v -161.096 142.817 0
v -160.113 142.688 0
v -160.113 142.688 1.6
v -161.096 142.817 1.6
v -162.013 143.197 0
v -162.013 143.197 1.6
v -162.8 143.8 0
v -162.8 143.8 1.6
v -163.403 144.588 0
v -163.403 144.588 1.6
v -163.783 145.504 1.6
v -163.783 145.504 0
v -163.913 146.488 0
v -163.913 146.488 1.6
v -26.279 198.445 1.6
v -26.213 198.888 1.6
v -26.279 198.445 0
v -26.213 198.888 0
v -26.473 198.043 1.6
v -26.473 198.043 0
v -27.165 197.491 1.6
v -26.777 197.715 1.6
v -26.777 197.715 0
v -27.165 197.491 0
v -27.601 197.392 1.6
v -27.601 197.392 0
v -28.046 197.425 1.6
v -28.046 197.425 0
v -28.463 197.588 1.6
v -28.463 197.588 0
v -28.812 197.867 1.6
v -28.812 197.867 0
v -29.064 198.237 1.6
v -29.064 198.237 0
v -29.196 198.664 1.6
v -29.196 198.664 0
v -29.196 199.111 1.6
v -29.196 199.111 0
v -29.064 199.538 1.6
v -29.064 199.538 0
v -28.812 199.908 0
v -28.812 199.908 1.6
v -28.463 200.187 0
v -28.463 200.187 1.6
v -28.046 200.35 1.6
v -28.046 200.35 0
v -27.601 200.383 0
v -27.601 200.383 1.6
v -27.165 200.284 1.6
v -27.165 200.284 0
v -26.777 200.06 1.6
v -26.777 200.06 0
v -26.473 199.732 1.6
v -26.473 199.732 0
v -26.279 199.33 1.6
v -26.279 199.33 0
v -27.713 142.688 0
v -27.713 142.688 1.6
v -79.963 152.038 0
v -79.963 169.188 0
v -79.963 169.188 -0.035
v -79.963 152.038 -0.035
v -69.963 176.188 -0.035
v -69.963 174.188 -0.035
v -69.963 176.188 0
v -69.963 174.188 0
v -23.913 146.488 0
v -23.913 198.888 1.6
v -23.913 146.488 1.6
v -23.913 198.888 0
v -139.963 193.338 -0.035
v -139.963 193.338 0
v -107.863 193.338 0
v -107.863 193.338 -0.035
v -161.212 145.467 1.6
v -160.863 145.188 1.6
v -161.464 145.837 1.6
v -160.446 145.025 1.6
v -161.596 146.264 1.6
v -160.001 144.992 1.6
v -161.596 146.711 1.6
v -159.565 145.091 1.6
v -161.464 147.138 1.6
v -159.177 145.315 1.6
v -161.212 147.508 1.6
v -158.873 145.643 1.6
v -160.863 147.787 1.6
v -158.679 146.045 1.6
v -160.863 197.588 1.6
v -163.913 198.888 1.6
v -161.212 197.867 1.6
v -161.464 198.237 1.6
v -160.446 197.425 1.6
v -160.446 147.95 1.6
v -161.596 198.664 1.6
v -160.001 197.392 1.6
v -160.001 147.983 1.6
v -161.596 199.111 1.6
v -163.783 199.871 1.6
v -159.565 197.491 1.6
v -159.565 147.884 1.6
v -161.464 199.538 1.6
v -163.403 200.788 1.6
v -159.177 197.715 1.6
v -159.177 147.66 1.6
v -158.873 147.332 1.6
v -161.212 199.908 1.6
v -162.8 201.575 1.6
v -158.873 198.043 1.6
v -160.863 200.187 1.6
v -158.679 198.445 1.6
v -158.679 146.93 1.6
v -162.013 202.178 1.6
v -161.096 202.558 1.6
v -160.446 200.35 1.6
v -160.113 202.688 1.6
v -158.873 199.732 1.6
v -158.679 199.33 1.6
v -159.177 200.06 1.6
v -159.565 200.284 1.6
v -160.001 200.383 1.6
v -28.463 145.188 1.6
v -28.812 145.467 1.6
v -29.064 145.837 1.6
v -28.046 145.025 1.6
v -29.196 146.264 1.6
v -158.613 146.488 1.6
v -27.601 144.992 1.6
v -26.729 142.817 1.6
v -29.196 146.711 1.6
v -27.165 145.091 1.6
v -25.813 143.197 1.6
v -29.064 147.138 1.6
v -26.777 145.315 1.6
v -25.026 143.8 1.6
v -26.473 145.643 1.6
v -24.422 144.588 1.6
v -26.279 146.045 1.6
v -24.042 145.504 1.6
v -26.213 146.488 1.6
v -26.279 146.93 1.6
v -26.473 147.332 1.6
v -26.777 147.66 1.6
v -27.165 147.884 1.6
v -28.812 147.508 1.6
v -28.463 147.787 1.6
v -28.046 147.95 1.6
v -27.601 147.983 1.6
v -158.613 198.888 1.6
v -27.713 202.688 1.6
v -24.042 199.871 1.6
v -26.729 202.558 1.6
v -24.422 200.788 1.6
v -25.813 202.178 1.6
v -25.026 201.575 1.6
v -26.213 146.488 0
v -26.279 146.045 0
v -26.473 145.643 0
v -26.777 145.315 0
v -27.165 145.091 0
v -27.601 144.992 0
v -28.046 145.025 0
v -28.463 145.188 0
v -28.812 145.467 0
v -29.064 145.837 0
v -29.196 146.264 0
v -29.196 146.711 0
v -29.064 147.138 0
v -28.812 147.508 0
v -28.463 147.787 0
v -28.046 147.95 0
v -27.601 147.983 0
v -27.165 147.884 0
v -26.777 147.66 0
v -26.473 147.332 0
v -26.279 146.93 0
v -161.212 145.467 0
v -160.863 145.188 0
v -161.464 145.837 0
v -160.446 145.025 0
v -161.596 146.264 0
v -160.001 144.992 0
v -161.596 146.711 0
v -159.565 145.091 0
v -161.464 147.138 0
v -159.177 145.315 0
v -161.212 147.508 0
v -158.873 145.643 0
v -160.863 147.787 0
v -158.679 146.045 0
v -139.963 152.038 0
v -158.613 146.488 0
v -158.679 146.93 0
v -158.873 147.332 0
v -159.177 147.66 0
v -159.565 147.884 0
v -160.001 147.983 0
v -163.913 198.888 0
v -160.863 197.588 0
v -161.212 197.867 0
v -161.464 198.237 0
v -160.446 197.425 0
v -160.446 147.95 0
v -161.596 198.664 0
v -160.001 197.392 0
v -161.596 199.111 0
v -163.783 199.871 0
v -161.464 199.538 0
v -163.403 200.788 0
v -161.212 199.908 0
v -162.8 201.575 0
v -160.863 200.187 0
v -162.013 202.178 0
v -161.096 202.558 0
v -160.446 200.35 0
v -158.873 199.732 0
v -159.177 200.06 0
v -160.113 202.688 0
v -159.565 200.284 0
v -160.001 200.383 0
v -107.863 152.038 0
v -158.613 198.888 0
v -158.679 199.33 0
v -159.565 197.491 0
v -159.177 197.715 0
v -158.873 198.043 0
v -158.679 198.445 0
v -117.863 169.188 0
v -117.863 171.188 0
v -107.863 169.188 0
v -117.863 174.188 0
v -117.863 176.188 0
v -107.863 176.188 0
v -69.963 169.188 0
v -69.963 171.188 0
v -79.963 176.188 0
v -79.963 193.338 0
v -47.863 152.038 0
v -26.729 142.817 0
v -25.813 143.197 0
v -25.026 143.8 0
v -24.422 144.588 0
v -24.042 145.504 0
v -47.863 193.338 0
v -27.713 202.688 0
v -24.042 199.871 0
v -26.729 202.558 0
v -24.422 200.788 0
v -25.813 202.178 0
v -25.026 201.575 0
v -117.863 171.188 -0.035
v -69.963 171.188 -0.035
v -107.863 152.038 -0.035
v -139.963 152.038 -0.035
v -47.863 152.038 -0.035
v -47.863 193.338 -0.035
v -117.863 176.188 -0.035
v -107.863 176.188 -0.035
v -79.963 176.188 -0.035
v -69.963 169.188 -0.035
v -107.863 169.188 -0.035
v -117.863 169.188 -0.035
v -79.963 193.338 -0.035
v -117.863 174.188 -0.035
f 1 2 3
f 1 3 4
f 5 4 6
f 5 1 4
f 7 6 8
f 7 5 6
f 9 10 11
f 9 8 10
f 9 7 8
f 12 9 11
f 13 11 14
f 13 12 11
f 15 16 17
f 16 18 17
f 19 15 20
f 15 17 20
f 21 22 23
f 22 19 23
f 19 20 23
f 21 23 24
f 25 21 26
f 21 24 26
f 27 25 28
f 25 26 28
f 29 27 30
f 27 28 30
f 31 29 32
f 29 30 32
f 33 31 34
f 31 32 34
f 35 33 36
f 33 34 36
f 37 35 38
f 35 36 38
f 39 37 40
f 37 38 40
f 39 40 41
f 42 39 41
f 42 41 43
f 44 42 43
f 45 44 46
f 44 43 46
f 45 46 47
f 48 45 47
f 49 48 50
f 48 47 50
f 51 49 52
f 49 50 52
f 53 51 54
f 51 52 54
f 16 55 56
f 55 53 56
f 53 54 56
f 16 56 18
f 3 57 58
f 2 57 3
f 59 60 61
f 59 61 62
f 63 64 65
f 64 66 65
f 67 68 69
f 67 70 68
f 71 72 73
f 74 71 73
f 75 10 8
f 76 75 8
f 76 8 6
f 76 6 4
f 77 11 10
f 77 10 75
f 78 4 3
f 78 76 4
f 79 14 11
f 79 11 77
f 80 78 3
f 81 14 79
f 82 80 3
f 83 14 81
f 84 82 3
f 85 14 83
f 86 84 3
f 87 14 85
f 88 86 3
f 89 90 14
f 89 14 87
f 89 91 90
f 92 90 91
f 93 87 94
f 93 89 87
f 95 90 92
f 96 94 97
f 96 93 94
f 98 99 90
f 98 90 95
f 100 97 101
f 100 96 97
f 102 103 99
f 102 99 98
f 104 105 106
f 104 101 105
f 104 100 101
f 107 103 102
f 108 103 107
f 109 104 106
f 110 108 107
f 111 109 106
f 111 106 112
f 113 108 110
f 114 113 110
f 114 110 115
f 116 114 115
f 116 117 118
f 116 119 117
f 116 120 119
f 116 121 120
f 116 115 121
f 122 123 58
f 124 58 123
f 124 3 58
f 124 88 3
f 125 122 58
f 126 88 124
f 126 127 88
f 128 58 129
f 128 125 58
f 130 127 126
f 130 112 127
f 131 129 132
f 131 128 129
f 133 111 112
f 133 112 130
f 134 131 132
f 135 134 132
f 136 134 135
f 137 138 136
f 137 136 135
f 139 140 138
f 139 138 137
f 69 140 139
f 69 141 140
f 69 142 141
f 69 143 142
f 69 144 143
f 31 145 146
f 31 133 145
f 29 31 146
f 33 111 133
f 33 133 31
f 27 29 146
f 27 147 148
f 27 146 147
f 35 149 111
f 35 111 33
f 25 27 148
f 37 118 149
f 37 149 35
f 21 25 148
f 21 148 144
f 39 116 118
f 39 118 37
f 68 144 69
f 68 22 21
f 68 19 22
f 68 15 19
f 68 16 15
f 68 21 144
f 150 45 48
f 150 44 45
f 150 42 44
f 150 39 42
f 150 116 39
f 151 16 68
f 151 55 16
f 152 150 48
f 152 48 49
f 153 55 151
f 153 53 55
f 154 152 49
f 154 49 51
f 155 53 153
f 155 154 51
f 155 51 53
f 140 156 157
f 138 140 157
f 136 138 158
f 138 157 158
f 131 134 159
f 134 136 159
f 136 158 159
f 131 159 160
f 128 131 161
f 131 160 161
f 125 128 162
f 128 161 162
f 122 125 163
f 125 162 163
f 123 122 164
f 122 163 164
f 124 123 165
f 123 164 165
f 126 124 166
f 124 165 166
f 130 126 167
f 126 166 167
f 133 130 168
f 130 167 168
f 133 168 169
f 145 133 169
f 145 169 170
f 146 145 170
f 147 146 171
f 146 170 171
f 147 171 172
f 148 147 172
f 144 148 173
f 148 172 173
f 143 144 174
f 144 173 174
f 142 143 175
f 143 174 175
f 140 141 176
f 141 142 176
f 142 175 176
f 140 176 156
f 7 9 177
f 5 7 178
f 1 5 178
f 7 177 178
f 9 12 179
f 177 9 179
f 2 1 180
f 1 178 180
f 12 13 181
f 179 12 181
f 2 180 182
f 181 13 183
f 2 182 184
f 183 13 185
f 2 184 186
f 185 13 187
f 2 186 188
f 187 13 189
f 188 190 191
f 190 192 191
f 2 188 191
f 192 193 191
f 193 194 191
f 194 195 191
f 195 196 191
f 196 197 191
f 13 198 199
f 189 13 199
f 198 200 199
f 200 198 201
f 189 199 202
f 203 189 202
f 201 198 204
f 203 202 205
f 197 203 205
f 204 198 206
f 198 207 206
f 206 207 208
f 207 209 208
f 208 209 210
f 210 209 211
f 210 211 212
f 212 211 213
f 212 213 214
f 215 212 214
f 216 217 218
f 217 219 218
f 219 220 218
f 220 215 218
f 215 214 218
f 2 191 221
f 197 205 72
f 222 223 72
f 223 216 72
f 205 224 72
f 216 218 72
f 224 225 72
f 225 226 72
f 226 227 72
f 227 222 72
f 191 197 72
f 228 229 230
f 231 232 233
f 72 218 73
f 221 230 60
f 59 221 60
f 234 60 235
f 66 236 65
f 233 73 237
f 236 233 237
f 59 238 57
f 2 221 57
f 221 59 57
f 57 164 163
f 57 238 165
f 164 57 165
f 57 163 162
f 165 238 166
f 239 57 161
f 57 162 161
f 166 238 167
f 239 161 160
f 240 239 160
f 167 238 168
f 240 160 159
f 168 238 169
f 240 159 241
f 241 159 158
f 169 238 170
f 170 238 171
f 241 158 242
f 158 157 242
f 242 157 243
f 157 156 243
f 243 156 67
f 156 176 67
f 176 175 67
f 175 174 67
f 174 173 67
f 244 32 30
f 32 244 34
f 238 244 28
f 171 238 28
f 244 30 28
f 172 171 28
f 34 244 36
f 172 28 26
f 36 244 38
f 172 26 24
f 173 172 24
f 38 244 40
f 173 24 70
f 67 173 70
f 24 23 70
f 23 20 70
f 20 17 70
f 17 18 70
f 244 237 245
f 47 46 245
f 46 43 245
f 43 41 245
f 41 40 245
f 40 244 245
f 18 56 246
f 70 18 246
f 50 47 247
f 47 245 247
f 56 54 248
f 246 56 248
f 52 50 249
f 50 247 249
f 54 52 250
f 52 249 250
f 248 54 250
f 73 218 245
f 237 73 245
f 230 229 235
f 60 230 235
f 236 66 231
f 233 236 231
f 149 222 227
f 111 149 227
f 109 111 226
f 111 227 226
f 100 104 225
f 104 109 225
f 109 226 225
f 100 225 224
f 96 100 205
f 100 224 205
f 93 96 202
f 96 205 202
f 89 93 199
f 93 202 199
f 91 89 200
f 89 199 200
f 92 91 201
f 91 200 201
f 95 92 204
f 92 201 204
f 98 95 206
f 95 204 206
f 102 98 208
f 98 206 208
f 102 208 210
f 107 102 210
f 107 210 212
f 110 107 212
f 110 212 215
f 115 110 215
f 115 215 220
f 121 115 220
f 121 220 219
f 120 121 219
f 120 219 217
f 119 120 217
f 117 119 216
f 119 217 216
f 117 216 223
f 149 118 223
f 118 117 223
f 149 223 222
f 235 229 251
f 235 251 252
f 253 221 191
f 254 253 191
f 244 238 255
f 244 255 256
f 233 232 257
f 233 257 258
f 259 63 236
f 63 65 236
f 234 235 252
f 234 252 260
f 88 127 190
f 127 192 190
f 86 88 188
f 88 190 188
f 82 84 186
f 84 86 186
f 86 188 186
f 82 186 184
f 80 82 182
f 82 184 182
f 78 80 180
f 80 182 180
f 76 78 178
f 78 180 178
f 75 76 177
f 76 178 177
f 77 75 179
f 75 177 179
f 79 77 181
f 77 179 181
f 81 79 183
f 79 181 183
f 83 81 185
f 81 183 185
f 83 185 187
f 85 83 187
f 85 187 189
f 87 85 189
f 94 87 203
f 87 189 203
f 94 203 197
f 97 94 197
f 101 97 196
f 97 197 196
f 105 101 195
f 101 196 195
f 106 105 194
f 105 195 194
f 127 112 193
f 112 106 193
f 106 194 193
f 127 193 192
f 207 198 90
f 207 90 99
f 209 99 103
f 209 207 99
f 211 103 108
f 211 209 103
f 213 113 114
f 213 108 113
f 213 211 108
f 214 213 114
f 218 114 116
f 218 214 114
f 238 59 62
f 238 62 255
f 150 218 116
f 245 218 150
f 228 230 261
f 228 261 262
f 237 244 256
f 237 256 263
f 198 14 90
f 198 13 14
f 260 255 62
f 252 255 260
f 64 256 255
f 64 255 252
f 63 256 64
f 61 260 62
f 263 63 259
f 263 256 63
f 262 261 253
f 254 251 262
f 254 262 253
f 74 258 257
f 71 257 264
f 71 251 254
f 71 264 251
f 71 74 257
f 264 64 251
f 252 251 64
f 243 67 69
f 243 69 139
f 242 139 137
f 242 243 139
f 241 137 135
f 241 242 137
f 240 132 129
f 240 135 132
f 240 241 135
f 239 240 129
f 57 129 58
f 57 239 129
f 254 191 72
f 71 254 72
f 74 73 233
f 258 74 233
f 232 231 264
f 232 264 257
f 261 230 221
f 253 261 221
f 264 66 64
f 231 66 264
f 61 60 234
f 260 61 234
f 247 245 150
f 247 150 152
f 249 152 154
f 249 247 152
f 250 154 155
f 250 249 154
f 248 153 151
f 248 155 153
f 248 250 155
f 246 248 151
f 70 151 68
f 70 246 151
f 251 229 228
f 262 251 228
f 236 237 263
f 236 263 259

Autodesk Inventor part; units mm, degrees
ref_plane "YZ Plane" through (0, 0, 0) normal (1, 0, 0) x (0, 1, 0)
ref_plane "XZ Plane" through (0, 0, 0) normal (0, 1, 0) x (-1, 0, 0)
ref_plane "XY Plane" through (0, 0, 0) normal (0, 0, 1) x (1, 0, 0)
sketch "Sketch1" plane through (0, 0, 0) normal (0, 0, 1) x (1, 0, 0)
  line L0 (-160.1126, 202.6875) -> (-23.9126, 202.6875)
  line L1 (-23.9126, 202.6875) -> (-23.9126, 142.6875)
  line L2 (-23.9126, 142.6875) -> (-163.9126, 142.6875)
  line L3 (-163.9126, 142.6875) -> (-163.9126, 198.8875)
  circle A0 centre (-160.1126, 198.8875) radius 1.5
  arc A1 (-160.1126, 202.6875) -> (-163.9126, 198.8875) centre (-160.1126, 198.8875) ccw
  line L4 (-163.9126, 172.6875) -> (-23.9126, 172.6875) construction
  line L5 (-93.9126, 142.6875) -> (-93.9126, 202.6875) construction
  circle A2 centre (-160.1126, 146.4875) radius 1.5
  circle A3 centre (-27.7126, 198.8875) radius 1.5
  circle A4 centre (-27.7126, 146.4875) radius 1.5
  arc A5 (-163.9126, 146.4875) -> (-160.1126, 142.6875) centre (-160.1126, 146.4875) ccw
  arc A6 (-23.9126, 198.8875) -> (-27.7126, 202.6875) centre (-27.7126, 198.8875) ccw
  arc A7 (-27.7126, 142.6875) -> (-23.9126, 146.4875) centre (-27.7126, 146.4875) ccw
  point P0 (0, 0)
  point P1 (-163.9126, 202.6875)
  dimension "d0" = 60
  dimension "d1" = 140
  dimension "d2" = 3
  dimension "d3" = 3.8
  dimension "d4" = 3.8
  dimension "d5" = 3.8
extrude "Extrusion1" add sketch "Sketch1" along normal blind 1.6 contours L0 A6 L1 A7 L2 A5 L3 A1
sketch "Sketch2" plane through (0, 0, 0) normal (0, 0, -1) x (-1, 0, 0)
  line L0 (139.9626, 193.3375) -> (107.8626, 193.3375)
  line L1 (107.8626, 193.3375) -> (107.8626, 152.0375) construction
  line L2 (107.8626, 152.0375) -> (139.9626, 152.0375)
  line L3 (139.9626, 152.0375) -> (139.9626, 193.3375)
  line L4 (139.9626, 172.6875) -> (107.8626, 172.6875) construction
  line L5 (117.8626, 176.1875) -> (107.8626, 176.1875)
  line L6 (107.8626, 176.1875) -> (107.8626, 169.1875) construction
  line L7 (107.8626, 169.1875) -> (117.8626, 169.1875)
  line L8 (117.8626, 169.1875) -> (117.8626, 176.1875) construction
  line L9 (117.8626, 176.1875) -> (107.8626, 169.1875) construction
  line L10 (107.8626, 176.1875) -> (117.8626, 169.1875) construction
  line L11 (107.8626, 193.3375) -> (107.8626, 176.1875)
  line L12 (107.8626, 169.1875) -> (107.8626, 152.0375)
  line L13 (93.9126, 174.1875) -> (117.8626, 174.1875)
  line L14 (117.8626, 174.1875) -> (117.8626, 171.1875) construction
  line L15 (117.8626, 171.1875) -> (93.9126, 171.1875)
  line L16 (93.9126, 171.1875) -> (93.9126, 174.1875)
  line L17 (93.9126, 174.1875) -> (117.8626, 171.1875) construction
  line L18 (117.8626, 174.1875) -> (93.9126, 171.1875) construction
  line L19 (117.8626, 174.1875) -> (117.8626, 176.1875)
  line L20 (27.7126, 202.6875) -> (160.1126, 202.6875) projected
  line L21 (160.1126, 142.6875) -> (27.7126, 142.6875) projected
  line L22 (27.7126, 202.6875) -> (160.1126, 202.6875) projected
  line L23 (93.9126, 202.6875) -> (93.9126, 142.6875) construction
  line L24 (163.9126, 198.8875) -> (163.9126, 146.4875) projected
  line L25 (163.9126, 172.6875) -> (23.9126, 172.6875) construction
  line L26 (23.9126, 146.4875) -> (23.9126, 198.8875) projected
  line L27 (123.9126, 193.3375) -> (123.9126, 152.0375) construction
  line L28 (47.8626, 193.3375) -> (79.9626, 193.3375)
  line L29 (79.9626, 193.3375) -> (79.9626, 152.0375) construction
  line L30 (79.9626, 152.0375) -> (47.8626, 152.0375)
  line L31 (47.8626, 152.0375) -> (47.8626, 193.3375)
  line L32 (47.8626, 172.6875) -> (79.9626, 172.6875) construction
  line L33 (69.9626, 176.1875) -> (79.9626, 176.1875)
  line L34 (79.9626, 176.1875) -> (79.9626, 169.1875) construction
  line L35 (79.9626, 169.1875) -> (69.9626, 169.1875)
  line L36 (69.9626, 169.1875) -> (69.9626, 176.1875) construction
  line L37 (69.9626, 176.1875) -> (79.9626, 169.1875) construction
  line L38 (79.9626, 176.1875) -> (69.9626, 169.1875) construction
  line L39 (79.9626, 193.3375) -> (79.9626, 176.1875)
  line L40 (79.9626, 169.1875) -> (79.9626, 152.0375)
  line L41 (93.9126, 174.1875) -> (69.9626, 174.1875)
  line L42 (69.9626, 174.1875) -> (69.9626, 171.1875) construction
  line L43 (69.9626, 171.1875) -> (93.9126, 171.1875)
  line L44 (69.9626, 174.1875) -> (69.9626, 176.1875)
  line L45 (63.9126, 193.3375) -> (63.9126, 152.0375) construction
  line L46 (117.8626, 171.1875) -> (117.8626, 169.1875)
  line L47 (69.9626, 171.1875) -> (69.9626, 169.1875)
  point P0 (0, 0)
  point P1 (112.8626, 172.6875)
  point P2 (105.8876, 172.6875)
  point P3 (93.9126, 172.6875)
  point P4 (74.9626, 172.6875)
  point P5 (81.9376, 172.6875)
  dimension "d8" = 41.3
  dimension "d9" = 32.1
  dimension "d10" = 10
  dimension "d11" = 3
  dimension "d12" = 7
  dimension "d13" = 30
extrude "Extrusion2" add sketch "Sketch2" along normal blind 0.035
properties part number "Phased_array"
